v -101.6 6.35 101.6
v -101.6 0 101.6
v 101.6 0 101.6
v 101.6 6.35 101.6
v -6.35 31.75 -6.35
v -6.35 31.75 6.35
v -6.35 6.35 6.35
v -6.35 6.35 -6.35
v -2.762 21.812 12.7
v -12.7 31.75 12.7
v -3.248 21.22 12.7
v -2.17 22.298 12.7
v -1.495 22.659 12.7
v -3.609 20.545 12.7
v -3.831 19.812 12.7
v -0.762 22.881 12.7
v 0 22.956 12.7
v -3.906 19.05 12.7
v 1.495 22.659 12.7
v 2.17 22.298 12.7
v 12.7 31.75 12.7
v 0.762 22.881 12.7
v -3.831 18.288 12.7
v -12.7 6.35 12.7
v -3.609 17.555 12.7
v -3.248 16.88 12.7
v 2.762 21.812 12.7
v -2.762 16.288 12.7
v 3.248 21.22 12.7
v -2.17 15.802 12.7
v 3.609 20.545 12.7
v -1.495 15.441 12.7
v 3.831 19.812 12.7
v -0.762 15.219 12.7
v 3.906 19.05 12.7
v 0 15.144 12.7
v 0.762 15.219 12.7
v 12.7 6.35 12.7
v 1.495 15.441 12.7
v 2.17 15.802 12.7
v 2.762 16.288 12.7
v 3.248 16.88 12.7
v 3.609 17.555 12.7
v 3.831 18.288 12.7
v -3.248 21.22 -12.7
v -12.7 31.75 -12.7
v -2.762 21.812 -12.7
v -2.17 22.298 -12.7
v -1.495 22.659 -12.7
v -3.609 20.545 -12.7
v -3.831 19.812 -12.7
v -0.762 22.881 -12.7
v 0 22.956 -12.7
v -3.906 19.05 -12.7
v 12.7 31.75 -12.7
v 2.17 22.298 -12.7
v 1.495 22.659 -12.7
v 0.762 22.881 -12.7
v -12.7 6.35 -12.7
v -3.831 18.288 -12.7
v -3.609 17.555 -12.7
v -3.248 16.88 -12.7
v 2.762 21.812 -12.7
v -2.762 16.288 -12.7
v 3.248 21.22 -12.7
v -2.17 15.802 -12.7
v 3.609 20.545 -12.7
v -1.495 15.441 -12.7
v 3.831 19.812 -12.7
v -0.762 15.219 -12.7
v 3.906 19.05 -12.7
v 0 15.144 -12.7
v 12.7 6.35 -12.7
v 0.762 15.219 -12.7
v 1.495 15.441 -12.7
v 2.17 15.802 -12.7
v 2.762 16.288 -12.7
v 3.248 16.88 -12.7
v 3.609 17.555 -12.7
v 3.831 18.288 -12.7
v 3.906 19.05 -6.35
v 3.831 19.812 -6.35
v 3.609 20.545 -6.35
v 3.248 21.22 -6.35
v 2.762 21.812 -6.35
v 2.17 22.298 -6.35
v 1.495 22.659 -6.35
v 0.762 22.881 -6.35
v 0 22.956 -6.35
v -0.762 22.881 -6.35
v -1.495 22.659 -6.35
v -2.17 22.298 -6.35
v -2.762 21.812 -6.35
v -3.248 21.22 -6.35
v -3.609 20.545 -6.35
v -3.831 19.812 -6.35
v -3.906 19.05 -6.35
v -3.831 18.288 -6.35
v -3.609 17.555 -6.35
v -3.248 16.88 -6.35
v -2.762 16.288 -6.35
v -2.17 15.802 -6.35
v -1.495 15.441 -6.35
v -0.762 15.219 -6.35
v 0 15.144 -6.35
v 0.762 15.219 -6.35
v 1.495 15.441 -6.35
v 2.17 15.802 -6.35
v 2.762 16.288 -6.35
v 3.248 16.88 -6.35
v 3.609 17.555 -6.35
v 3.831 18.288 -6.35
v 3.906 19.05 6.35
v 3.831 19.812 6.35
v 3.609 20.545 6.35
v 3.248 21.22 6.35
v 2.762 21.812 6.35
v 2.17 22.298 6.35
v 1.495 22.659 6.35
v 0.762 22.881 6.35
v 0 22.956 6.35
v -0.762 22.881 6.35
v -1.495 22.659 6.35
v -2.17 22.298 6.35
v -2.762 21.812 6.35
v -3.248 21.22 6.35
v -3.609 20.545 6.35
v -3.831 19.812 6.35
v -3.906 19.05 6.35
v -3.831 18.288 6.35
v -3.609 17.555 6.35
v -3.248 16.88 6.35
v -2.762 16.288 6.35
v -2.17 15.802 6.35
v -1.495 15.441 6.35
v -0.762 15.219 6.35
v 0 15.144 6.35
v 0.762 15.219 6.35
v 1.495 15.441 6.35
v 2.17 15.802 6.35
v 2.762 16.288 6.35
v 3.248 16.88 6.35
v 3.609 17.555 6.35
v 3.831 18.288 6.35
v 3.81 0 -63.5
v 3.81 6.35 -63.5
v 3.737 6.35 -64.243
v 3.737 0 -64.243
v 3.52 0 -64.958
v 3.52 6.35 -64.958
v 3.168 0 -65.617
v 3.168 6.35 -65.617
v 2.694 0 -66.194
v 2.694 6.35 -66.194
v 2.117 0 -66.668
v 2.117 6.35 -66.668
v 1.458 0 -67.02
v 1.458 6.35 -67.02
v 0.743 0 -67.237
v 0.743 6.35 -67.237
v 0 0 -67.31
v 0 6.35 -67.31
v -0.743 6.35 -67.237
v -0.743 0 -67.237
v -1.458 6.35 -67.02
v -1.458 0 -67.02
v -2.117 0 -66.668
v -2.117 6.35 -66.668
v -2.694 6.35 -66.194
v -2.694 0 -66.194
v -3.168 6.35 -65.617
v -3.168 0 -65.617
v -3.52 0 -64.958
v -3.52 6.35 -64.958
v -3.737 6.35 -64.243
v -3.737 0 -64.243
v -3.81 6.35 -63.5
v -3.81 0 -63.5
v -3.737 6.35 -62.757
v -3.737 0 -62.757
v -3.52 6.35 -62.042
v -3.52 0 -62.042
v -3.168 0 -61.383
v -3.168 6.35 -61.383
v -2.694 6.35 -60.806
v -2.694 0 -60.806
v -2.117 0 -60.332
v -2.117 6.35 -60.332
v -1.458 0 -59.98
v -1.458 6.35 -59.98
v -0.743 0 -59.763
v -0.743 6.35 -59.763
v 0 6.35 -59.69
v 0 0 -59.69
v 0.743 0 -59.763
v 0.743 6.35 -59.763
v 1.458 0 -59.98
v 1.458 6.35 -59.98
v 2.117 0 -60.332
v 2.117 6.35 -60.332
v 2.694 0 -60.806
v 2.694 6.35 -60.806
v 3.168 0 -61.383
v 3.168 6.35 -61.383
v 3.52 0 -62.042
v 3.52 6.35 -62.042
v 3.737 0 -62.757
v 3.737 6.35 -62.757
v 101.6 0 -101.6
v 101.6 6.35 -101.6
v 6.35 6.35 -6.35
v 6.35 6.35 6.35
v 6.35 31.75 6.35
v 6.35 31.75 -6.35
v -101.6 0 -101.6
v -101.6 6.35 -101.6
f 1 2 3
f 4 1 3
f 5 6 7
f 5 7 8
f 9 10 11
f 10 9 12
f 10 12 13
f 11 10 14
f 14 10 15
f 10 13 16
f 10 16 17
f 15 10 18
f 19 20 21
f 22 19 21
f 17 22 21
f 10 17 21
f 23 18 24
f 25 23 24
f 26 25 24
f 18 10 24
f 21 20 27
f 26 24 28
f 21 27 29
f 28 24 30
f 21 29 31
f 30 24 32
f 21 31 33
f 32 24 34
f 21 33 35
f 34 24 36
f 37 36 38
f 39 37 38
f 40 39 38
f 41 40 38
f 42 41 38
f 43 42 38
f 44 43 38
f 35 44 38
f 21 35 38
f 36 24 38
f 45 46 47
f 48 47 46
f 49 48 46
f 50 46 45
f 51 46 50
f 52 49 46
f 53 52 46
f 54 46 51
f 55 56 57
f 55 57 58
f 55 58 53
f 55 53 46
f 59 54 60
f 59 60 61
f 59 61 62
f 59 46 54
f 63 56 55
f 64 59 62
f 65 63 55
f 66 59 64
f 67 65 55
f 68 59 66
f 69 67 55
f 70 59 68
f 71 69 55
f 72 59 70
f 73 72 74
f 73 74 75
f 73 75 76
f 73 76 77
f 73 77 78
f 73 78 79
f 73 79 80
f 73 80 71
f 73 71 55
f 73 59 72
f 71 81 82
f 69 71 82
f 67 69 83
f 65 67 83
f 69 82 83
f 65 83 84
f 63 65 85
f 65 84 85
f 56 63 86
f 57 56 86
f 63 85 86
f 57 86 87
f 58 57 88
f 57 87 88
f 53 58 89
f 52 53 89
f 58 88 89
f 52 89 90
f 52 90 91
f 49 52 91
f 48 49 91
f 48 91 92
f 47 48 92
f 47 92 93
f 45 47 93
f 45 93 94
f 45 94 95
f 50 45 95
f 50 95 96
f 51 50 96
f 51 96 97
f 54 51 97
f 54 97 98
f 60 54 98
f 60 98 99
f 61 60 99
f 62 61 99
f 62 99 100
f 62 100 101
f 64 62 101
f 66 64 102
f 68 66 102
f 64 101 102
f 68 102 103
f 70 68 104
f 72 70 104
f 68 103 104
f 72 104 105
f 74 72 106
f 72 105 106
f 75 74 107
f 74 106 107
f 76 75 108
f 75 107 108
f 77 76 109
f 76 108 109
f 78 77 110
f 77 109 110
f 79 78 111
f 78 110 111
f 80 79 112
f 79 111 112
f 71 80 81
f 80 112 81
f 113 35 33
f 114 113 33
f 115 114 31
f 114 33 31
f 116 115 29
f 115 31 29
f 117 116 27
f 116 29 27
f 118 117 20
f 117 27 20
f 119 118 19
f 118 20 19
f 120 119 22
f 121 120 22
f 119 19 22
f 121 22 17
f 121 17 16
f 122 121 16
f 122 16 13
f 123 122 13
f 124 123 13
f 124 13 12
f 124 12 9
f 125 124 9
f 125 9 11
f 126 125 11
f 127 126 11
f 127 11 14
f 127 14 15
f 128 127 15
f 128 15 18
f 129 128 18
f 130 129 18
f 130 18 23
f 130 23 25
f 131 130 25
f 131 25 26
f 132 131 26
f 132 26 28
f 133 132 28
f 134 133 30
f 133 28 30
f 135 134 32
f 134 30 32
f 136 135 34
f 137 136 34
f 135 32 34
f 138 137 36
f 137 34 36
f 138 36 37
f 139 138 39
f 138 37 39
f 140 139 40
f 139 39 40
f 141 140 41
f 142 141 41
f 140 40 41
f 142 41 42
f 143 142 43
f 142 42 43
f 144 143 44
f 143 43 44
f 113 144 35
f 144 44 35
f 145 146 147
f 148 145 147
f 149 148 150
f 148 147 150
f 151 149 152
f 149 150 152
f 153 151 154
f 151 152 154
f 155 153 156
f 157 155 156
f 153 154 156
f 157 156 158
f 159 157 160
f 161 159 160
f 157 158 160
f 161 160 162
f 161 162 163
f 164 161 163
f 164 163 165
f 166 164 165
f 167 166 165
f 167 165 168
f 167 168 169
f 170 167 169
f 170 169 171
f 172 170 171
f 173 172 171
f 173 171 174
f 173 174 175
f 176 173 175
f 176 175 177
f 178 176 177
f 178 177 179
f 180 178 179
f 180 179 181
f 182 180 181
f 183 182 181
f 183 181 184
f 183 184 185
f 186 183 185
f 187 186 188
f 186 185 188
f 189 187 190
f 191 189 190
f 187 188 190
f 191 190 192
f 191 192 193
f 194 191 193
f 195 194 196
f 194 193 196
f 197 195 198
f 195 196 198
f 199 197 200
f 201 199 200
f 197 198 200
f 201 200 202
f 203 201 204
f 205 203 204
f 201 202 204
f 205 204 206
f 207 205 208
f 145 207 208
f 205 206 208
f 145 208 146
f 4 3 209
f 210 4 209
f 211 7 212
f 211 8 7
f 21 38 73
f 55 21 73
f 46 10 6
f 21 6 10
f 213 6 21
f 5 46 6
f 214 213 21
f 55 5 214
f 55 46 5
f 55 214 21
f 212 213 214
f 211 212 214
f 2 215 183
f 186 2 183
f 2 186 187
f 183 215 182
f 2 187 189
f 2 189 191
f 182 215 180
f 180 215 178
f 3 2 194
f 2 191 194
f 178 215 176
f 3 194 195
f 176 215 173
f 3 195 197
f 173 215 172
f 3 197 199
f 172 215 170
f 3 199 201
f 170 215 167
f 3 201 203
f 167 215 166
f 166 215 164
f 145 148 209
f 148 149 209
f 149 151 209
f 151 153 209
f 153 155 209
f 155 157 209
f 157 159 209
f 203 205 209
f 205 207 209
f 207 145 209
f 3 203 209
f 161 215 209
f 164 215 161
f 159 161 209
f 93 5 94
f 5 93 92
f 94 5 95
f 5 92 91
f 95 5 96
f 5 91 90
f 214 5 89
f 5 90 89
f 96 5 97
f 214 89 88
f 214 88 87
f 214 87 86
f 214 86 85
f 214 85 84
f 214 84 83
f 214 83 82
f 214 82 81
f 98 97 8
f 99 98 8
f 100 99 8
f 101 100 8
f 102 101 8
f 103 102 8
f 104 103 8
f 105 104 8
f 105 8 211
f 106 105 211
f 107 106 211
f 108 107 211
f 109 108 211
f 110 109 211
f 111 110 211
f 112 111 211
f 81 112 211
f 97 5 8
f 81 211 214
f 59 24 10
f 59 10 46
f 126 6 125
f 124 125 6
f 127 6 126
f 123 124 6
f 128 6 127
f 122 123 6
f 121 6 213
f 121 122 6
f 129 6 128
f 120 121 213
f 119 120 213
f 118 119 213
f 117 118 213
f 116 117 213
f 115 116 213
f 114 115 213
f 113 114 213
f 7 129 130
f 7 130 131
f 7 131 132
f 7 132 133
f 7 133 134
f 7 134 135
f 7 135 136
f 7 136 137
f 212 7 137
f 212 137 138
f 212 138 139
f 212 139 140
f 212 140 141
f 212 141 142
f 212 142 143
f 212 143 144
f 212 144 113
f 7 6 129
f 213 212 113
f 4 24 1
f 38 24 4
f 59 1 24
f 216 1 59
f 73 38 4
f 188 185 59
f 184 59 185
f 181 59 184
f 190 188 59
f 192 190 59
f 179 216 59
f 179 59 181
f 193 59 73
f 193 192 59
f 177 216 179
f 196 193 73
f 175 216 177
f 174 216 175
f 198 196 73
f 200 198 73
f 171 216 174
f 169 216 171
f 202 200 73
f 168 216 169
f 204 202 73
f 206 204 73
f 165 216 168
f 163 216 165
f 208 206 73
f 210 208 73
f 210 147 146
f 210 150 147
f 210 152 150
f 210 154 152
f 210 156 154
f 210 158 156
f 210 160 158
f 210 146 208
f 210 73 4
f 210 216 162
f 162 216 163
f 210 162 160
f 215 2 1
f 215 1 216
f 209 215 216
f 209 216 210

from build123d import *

# Parameters (mm, degrees)
SKETCH1_W           = 203.2
SKETCH1_H           = 203.2
BOSS_EXTRUDE1_DEPTH = 6.35
SKETCH2_W           = 25.4
SKETCH2_H           = 25.4
SKETCH2_W_2         = 12.7
SKETCH2_H_2         = 12.7
BOSS_EXTRUDE2_DEPTH = 31.75
SKETCH3_R           = 3.906287384
CUT_EXTRUDE1_DEPTH  = 25.4
SKETCH4_R           = 3.81
CUT_EXTRUDE2_DEPTH  = 25.4


with BuildPart() as part:
    # Sketch1 → Boss-Extrude1 (new body)
    with BuildSketch(Plane(origin=(0, 0, 0), x_dir=(1, 0, 0), z_dir=(0, 1, 0))):
        Rectangle(SKETCH1_W, SKETCH1_H)
    extrude(amount=BOSS_EXTRUDE1_DEPTH)

    # Sketch2 → Boss-Extrude2 (add)
    with BuildSketch(Plane(origin=(0, 0, 0), x_dir=(1, 0, 0), z_dir=(0, 1, 0))):
        Rectangle(SKETCH2_W, SKETCH2_H)
        Rectangle(SKETCH2_W_2, SKETCH2_H_2, mode=Mode.SUBTRACT)
    extrude(amount=BOSS_EXTRUDE2_DEPTH)

    # Sketch3 → Cut-Extrude1 (cut)
    with BuildSketch(Plane.XY.offset(12.7)):
        with Locations((0, 19.05)):
            Circle(SKETCH3_R)
    extrude(amount=-CUT_EXTRUDE1_DEPTH, mode=Mode.SUBTRACT)

    # Sketch4 → Cut-Extrude2 (cut)
    with BuildSketch(Plane(origin=(0, 6.35, 0), x_dir=(1, 0, 0), z_dir=(0, 1, 0))):
        with Locations((0, 63.5)):
            Circle(SKETCH4_R)
    extrude(amount=-CUT_EXTRUDE2_DEPTH, mode=Mode.SUBTRACT)


solid = part.part
